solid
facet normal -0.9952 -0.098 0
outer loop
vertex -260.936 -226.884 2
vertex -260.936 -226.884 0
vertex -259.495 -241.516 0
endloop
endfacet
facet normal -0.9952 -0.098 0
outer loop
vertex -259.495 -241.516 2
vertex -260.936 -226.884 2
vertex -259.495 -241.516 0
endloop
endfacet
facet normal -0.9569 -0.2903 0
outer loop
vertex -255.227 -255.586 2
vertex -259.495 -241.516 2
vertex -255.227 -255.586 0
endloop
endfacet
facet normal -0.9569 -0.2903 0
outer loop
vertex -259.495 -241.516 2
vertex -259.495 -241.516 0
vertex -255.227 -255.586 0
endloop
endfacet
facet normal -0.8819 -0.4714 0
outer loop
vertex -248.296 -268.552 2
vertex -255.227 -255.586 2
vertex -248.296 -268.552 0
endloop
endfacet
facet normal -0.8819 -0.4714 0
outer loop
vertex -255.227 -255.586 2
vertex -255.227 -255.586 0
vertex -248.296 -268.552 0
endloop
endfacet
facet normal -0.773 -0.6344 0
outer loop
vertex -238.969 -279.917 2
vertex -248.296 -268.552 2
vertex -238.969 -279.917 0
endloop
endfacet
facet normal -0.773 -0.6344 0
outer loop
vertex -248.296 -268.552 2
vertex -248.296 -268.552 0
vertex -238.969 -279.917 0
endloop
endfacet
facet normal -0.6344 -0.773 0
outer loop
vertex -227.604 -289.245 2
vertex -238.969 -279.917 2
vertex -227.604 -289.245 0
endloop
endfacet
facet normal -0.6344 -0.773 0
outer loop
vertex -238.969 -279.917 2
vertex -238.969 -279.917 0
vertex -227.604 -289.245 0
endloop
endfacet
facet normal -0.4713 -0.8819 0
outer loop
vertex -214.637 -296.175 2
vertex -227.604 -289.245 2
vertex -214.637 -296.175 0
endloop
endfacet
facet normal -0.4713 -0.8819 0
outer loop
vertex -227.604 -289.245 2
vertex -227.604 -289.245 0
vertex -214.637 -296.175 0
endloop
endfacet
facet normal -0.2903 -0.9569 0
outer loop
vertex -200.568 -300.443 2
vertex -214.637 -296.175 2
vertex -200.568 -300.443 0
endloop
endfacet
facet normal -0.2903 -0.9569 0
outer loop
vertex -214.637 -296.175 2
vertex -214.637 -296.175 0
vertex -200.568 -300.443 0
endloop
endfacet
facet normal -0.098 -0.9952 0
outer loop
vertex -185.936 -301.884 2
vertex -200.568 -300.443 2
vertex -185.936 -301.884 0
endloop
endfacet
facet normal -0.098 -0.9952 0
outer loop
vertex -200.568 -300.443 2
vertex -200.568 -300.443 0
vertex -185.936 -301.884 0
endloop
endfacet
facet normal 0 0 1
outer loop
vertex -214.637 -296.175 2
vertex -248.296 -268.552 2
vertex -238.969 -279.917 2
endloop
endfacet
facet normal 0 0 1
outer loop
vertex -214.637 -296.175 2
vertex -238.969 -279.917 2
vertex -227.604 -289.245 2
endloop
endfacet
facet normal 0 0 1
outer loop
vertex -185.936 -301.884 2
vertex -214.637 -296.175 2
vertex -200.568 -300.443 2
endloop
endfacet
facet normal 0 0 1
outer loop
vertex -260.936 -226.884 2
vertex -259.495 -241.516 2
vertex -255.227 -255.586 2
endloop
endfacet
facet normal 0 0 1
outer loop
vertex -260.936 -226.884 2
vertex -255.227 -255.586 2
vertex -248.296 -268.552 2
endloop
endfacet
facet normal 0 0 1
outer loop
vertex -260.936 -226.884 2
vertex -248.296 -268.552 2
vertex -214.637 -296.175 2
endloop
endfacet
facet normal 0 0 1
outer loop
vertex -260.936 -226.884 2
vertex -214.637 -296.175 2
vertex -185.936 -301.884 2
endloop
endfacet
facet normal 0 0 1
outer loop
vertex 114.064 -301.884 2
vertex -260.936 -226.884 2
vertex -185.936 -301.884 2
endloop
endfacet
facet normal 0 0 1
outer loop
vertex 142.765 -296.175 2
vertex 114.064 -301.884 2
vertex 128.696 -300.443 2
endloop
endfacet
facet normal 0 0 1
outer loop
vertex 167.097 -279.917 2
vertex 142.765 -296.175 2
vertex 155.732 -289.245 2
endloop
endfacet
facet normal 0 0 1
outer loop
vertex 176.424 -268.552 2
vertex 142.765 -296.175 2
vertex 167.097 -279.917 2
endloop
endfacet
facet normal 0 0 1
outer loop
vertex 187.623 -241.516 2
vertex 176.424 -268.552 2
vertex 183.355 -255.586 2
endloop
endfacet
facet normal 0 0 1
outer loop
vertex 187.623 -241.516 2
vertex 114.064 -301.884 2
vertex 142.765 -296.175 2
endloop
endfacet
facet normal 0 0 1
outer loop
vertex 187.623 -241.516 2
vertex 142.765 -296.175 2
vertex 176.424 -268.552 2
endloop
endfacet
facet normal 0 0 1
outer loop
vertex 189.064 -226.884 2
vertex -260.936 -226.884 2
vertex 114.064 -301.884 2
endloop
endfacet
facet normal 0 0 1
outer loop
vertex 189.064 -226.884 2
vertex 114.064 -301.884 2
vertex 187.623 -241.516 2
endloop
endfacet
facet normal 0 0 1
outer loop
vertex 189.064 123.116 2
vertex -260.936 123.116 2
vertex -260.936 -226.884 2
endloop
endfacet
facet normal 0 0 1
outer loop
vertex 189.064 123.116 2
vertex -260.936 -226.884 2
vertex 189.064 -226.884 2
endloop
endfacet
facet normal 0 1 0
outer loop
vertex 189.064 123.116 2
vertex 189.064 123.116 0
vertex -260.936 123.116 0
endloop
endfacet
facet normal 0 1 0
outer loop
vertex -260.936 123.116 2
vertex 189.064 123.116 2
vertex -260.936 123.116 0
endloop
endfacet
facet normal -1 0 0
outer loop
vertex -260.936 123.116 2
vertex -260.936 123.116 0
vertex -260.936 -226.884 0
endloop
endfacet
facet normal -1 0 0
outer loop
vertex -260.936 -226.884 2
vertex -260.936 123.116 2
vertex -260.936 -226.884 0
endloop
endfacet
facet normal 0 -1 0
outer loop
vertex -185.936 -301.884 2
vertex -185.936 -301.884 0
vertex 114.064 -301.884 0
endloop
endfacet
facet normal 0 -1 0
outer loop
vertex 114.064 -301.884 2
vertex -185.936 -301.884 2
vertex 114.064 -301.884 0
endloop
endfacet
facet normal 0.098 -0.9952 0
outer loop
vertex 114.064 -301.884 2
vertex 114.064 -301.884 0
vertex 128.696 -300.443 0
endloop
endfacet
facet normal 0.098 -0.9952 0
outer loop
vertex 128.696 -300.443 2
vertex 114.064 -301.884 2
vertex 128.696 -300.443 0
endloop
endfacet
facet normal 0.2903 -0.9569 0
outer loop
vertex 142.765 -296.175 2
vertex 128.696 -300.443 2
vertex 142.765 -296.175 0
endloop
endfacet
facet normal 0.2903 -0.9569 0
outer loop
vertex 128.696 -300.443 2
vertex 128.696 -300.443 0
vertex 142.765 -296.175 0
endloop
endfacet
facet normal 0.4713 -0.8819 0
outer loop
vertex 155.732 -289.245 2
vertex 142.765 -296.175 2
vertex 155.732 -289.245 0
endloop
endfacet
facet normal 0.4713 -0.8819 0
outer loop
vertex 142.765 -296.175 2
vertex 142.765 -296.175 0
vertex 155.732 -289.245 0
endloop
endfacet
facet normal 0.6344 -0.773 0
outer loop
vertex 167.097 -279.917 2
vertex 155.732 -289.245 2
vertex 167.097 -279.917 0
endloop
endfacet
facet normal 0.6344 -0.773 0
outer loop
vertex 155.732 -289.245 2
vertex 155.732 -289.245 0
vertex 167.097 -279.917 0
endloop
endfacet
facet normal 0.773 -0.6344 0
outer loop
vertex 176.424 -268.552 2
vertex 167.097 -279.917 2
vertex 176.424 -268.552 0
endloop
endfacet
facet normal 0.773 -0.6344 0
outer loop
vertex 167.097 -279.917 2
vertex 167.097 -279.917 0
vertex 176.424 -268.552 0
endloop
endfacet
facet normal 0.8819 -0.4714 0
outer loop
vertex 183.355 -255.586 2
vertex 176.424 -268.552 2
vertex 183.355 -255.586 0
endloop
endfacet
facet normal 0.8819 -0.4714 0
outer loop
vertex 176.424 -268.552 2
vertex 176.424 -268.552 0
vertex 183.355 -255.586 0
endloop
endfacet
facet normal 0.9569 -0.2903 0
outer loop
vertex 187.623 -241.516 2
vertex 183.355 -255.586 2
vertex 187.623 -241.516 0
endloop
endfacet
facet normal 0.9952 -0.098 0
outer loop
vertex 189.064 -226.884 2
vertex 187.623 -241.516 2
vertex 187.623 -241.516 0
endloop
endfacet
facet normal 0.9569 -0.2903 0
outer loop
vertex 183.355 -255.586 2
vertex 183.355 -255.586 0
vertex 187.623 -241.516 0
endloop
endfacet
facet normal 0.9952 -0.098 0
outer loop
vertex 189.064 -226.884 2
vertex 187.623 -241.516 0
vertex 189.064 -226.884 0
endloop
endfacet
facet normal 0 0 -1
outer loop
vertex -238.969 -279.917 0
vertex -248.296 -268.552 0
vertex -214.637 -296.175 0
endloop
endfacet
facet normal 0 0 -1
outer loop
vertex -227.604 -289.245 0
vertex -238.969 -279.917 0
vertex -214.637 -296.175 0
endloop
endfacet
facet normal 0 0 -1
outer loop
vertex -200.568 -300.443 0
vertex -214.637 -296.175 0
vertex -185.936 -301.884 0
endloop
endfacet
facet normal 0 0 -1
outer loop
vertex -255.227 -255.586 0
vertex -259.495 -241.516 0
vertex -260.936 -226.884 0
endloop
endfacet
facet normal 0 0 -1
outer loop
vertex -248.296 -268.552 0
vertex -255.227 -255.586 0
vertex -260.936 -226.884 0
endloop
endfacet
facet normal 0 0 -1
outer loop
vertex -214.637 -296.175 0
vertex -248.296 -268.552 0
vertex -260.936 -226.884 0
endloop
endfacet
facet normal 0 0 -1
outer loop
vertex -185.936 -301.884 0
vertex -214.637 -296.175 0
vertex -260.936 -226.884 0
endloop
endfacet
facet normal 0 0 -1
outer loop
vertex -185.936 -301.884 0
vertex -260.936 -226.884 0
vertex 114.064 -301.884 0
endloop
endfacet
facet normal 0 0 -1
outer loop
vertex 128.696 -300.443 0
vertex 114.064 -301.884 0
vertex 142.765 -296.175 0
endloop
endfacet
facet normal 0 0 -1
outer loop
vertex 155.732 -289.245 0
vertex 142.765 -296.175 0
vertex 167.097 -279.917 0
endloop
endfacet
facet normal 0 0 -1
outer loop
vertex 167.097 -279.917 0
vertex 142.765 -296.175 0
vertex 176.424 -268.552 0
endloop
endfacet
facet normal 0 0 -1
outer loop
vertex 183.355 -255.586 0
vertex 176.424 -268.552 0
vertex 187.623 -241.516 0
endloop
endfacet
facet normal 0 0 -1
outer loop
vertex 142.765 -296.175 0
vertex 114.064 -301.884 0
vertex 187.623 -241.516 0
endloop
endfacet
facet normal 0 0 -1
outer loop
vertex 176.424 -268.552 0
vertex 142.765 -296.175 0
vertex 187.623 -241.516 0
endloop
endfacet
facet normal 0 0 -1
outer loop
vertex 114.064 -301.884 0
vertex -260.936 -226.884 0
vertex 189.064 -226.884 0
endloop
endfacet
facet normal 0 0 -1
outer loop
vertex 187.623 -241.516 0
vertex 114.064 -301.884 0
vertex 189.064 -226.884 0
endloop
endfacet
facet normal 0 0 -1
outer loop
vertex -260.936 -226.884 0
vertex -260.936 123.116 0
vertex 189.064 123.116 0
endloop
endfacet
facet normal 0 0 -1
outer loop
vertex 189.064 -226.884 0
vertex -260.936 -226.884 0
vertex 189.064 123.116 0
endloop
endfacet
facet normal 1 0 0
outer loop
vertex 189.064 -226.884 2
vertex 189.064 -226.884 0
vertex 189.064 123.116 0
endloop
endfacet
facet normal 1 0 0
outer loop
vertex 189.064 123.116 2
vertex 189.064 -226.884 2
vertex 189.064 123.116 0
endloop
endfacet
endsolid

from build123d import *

# Parameters (mm, degrees)
EXTRUDE_2_DEPTH = 2


with BuildPart() as part:
    # Эскиз1 → Бобышка-Вытянуть2 (new body)
    with BuildSketch(Plane.XY):
        with BuildLine():
            Line((-260.93597277, 123.115577889), (-260.93597277, -226.884422111))
            ThreePointArc((-260.93597277, -226.884422111), (-238.968981359, -279.9174307), (-185.93597277, -301.884422111))
            Line((-185.93597277, -301.884422111), (114.06402723, -301.884422111))
            ThreePointArc((114.06402723, -301.884422111), (167.097035819, -279.9174307), (189.06402723, -226.884422111))
            Line((189.06402723, -226.884422111), (189.06402723, 123.115577889))
            Line((189.06402723, 123.115577889), (164.06402723, 123.115577889))
            Line((164.06402723, 123.115577889), (-260.93597277, 123.115577889))
        make_face()
    extrude(amount=EXTRUDE_2_DEPTH)


solid = part.part
